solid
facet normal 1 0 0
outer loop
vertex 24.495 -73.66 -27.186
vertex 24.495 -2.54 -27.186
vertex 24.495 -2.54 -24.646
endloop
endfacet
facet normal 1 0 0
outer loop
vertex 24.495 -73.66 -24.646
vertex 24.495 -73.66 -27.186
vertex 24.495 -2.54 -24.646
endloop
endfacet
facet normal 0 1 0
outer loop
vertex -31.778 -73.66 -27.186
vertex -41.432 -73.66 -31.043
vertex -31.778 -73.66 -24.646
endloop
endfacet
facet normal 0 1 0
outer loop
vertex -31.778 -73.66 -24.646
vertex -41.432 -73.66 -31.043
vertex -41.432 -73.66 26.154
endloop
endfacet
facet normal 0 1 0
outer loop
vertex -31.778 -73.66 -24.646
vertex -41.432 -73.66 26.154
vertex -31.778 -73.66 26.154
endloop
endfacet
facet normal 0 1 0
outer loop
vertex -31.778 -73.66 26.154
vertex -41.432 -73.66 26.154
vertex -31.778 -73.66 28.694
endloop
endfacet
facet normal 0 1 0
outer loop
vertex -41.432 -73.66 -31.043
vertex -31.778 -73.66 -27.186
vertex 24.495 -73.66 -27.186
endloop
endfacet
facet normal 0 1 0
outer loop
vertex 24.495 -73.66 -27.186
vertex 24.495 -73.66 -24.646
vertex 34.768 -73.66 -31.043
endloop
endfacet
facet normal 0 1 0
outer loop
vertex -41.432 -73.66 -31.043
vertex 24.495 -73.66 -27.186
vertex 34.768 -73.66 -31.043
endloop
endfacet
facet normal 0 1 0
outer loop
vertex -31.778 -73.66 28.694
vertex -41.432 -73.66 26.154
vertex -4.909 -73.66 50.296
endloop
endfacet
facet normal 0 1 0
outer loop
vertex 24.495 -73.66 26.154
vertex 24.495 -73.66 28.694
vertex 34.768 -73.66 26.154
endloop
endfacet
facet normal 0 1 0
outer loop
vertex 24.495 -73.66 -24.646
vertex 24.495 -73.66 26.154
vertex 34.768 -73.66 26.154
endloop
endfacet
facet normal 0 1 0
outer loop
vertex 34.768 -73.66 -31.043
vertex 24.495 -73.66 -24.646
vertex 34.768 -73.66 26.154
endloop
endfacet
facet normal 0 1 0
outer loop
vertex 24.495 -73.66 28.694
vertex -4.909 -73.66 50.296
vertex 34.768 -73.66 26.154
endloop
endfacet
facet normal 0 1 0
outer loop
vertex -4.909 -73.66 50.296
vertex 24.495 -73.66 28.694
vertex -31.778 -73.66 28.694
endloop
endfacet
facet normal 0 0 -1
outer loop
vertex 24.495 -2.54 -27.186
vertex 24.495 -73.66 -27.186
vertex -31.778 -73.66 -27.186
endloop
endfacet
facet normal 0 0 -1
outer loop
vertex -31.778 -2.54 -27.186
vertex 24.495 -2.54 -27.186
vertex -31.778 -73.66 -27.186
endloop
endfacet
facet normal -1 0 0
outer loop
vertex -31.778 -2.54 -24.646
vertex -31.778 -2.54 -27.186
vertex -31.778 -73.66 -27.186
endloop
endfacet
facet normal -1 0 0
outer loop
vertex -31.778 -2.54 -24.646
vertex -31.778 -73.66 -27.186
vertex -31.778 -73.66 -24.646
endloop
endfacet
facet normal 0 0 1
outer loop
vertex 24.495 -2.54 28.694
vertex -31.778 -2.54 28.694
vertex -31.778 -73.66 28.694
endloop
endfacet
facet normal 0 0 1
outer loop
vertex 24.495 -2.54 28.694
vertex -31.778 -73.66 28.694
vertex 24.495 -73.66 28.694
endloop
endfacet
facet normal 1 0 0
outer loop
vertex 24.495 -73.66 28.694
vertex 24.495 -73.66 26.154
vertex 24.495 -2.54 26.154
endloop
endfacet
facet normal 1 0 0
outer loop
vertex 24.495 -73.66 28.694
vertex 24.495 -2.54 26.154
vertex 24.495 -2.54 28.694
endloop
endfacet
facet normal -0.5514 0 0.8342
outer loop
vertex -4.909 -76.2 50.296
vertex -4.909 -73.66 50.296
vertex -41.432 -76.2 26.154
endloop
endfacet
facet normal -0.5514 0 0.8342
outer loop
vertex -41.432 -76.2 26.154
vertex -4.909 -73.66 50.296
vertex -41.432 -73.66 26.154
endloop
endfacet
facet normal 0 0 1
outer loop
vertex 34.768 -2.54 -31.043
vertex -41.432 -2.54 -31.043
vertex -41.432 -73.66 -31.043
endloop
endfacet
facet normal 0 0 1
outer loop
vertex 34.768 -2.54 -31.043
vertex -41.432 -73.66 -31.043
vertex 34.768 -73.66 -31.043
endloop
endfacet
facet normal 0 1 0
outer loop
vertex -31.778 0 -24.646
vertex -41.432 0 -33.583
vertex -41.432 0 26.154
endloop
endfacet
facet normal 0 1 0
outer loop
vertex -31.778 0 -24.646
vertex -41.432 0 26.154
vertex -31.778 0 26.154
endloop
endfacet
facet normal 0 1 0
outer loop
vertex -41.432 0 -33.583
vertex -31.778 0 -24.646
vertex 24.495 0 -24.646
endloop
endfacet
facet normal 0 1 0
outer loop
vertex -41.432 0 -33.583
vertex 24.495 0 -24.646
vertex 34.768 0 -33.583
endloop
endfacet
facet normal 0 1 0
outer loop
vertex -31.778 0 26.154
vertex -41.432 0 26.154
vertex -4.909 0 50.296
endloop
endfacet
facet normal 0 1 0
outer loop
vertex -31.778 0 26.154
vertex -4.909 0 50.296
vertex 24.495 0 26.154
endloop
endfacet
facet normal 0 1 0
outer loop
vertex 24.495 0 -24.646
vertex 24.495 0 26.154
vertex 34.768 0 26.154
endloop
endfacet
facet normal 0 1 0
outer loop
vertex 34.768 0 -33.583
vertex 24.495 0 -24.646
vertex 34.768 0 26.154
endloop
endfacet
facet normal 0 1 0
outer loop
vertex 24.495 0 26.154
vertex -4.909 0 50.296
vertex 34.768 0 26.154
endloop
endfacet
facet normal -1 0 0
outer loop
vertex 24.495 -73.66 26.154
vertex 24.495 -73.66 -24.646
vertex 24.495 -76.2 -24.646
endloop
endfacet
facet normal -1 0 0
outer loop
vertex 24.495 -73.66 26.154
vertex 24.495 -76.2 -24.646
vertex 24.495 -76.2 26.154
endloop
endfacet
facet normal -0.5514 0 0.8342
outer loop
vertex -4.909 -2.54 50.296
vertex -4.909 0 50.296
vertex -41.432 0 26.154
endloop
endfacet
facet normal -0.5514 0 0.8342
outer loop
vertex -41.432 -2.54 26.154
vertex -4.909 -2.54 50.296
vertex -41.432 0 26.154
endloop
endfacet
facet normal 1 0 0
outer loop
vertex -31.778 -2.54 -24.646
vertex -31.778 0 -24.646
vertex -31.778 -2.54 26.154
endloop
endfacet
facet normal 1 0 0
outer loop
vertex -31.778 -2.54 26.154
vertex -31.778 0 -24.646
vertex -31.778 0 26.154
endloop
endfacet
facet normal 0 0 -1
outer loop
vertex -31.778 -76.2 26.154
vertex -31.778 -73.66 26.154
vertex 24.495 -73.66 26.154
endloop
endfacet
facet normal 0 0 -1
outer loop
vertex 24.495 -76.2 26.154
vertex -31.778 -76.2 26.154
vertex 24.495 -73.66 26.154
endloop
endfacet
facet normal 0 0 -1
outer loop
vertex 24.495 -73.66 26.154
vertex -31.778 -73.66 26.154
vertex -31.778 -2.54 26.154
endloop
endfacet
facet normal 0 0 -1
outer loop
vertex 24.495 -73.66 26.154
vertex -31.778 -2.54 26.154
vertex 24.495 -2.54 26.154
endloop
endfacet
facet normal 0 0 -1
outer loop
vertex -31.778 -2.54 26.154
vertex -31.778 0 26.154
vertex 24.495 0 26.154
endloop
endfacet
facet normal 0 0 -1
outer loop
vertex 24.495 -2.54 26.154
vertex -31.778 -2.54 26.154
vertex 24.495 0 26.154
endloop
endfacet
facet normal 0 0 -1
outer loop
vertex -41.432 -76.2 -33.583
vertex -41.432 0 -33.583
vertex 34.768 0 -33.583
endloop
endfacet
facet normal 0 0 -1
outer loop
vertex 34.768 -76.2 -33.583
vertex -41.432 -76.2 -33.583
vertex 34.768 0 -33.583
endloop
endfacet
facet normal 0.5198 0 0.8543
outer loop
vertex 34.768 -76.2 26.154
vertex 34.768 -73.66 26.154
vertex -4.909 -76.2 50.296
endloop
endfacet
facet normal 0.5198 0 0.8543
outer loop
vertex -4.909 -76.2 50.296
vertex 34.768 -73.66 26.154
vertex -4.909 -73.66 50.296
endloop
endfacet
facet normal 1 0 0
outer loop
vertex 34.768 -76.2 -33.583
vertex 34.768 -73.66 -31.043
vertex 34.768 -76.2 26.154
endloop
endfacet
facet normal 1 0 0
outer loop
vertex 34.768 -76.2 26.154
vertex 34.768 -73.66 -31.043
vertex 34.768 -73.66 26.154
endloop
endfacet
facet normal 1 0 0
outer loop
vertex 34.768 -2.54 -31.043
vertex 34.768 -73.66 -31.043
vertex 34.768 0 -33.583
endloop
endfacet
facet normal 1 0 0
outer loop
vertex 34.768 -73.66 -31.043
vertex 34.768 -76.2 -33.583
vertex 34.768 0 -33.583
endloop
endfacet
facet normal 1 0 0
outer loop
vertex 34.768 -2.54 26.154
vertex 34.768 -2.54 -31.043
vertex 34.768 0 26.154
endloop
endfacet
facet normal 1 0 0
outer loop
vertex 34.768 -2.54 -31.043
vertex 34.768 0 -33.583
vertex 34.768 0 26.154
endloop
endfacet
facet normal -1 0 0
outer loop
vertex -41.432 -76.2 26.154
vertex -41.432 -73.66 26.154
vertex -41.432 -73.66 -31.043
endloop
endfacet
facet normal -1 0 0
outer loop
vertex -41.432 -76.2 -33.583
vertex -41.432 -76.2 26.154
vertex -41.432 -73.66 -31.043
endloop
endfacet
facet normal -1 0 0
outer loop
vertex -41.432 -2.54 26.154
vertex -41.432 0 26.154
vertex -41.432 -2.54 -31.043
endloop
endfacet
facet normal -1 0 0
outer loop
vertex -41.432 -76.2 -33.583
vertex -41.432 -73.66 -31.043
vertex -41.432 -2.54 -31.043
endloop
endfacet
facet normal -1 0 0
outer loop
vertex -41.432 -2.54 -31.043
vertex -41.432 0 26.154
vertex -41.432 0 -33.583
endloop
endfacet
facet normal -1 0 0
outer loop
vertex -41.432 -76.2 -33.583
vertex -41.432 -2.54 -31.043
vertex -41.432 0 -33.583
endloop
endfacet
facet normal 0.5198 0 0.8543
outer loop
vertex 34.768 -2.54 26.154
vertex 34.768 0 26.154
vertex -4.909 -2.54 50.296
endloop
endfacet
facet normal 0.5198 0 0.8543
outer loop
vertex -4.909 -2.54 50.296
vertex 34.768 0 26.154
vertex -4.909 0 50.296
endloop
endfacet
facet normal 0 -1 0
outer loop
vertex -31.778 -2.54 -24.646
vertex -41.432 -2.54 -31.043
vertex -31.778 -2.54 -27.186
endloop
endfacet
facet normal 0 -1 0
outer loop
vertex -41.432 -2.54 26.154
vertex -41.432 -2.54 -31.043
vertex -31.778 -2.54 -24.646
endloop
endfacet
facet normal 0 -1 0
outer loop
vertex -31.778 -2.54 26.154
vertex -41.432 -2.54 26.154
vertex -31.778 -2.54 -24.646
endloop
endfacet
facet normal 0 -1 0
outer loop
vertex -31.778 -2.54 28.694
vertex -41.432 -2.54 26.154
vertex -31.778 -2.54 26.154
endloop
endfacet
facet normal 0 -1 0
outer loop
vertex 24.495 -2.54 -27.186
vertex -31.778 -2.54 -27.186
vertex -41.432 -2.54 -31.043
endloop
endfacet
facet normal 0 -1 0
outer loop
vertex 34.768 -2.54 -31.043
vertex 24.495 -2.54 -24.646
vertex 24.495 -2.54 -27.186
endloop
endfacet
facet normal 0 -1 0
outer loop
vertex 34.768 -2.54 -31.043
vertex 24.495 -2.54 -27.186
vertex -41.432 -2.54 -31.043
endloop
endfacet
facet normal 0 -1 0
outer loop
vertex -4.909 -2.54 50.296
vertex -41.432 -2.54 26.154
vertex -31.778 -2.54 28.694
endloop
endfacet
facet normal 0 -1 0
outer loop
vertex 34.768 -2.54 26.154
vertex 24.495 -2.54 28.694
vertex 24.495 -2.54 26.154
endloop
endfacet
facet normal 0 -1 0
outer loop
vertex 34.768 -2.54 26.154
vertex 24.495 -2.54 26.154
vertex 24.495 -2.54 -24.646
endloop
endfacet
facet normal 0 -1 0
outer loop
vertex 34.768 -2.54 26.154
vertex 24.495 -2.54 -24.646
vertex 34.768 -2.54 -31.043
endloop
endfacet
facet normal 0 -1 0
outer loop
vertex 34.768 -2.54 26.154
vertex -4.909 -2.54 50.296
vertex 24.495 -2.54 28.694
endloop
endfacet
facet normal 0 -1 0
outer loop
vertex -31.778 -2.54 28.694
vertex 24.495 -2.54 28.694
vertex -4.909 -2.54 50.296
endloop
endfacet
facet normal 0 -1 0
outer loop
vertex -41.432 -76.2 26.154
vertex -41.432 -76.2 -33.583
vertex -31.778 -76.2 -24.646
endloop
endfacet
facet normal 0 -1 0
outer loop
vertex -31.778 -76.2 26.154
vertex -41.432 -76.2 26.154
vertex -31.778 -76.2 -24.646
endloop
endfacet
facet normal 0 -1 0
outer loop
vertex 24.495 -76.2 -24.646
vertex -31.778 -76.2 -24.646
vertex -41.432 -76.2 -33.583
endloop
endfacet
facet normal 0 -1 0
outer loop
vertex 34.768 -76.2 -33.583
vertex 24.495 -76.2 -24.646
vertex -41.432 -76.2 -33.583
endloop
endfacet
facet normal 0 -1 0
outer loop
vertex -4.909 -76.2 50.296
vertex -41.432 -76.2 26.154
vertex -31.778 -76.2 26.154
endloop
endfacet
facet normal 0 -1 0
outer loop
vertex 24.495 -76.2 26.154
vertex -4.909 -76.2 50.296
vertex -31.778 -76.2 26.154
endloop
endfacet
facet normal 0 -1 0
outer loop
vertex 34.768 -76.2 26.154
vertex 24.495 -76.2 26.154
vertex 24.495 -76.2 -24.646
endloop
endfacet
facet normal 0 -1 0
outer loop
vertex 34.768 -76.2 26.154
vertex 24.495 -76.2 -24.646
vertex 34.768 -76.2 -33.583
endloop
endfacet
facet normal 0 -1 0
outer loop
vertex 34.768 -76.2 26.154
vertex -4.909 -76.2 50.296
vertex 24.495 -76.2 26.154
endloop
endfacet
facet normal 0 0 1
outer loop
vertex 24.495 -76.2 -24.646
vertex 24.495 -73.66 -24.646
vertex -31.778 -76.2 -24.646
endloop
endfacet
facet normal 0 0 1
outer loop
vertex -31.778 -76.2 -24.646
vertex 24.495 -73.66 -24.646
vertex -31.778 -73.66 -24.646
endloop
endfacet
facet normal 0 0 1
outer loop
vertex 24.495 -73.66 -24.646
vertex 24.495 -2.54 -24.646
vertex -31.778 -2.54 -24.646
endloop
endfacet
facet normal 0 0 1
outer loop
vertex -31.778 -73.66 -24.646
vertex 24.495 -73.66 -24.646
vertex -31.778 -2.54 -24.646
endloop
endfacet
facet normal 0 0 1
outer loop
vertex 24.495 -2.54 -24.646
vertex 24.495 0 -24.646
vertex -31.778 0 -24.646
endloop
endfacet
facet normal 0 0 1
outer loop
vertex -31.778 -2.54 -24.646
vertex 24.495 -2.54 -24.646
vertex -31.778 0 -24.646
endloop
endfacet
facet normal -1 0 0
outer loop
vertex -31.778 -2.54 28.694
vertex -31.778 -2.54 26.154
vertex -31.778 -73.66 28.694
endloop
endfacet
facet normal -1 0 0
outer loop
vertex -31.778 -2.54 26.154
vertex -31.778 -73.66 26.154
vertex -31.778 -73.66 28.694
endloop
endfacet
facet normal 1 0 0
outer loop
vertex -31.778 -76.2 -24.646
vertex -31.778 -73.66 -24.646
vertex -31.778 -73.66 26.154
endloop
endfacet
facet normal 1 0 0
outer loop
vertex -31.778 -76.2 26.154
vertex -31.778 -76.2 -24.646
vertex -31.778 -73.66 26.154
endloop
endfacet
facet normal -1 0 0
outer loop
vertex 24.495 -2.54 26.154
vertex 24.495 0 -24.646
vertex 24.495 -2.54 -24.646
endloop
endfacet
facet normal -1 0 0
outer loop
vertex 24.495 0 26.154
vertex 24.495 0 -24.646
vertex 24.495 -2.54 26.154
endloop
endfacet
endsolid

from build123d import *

# Parameters (mm, degrees)
F0_W     = 10.2729936957
F0_H     = 50.8
F0_W_2   = 9.6539677948
F1_DEPTH = 76.2
F2_T     = 2.54


# Not quite as in the source:
# - a shell that OpenCascade refuses in one call is made with other operations: the cavity is built on its own and cut out


with BuildPart() as f1:
    # F0 (on Front) → F1 (new body)
    with BuildSketch(Plane.XZ):
        Polygon((-4.9094697461, 50.2964220941), (-41.4324142039, 26.1541400105), (-31.7784464091, 26.1541400105), (24.4945921004, 26.1541400105), (34.7675857961, 26.1541400105), align=None)
        with Locations((29.6310889482, 0.7541400105)):
            Rectangle(F0_W, F0_H)
        with Locations((-36.6054303065, 0.7541400105)):
            Rectangle(F0_W_2, F0_H)
        Polygon((-31.7784464091, -24.6458599895), (-41.4324142039, -24.6458599895), (-41.4324142039, -33.582534641), (34.7675857961, -33.582534641), (34.7675857961, -24.6458599895), (24.4945921004, -24.6458599895), align=None)
    extrude(amount=F1_DEPTH)

    # F2: shell of thickness 2.54, made by hand


with BuildPart() as f2_core1:
    # F2_t2: copy of F1
    add(f1.part)

    # the walls: a layer under each face that stays
    f2_faces = [f2_core1.faces().sort_by_distance(p)[0] for p in [
        (-3.3324142039, -38.1, -33.582534641),
        (-3.6419271544, -38.1, 26.1541400105),
        (-3.6419271544, -38.1, -24.6458599895),
        (-3.3324142039, 0, 36.3165959716),
        (-3.3324142039, -76.2, 36.3165959716),
    ]]
    thicken(f2_faces, amount=-F2_T, mode=Mode.SUBTRACT)


with BuildPart() as f1_1:
    add(f1.part)

    # what is left inside the walls is the cavity
    f2_cavity = [f2_core1.part.solids().sort_by_distance(p)[0] for p in [
        (-3.332414, -49.953333, -31.017135),
    ]]
    add(f2_cavity, mode=Mode.SUBTRACT)


solid = f1_1.part
